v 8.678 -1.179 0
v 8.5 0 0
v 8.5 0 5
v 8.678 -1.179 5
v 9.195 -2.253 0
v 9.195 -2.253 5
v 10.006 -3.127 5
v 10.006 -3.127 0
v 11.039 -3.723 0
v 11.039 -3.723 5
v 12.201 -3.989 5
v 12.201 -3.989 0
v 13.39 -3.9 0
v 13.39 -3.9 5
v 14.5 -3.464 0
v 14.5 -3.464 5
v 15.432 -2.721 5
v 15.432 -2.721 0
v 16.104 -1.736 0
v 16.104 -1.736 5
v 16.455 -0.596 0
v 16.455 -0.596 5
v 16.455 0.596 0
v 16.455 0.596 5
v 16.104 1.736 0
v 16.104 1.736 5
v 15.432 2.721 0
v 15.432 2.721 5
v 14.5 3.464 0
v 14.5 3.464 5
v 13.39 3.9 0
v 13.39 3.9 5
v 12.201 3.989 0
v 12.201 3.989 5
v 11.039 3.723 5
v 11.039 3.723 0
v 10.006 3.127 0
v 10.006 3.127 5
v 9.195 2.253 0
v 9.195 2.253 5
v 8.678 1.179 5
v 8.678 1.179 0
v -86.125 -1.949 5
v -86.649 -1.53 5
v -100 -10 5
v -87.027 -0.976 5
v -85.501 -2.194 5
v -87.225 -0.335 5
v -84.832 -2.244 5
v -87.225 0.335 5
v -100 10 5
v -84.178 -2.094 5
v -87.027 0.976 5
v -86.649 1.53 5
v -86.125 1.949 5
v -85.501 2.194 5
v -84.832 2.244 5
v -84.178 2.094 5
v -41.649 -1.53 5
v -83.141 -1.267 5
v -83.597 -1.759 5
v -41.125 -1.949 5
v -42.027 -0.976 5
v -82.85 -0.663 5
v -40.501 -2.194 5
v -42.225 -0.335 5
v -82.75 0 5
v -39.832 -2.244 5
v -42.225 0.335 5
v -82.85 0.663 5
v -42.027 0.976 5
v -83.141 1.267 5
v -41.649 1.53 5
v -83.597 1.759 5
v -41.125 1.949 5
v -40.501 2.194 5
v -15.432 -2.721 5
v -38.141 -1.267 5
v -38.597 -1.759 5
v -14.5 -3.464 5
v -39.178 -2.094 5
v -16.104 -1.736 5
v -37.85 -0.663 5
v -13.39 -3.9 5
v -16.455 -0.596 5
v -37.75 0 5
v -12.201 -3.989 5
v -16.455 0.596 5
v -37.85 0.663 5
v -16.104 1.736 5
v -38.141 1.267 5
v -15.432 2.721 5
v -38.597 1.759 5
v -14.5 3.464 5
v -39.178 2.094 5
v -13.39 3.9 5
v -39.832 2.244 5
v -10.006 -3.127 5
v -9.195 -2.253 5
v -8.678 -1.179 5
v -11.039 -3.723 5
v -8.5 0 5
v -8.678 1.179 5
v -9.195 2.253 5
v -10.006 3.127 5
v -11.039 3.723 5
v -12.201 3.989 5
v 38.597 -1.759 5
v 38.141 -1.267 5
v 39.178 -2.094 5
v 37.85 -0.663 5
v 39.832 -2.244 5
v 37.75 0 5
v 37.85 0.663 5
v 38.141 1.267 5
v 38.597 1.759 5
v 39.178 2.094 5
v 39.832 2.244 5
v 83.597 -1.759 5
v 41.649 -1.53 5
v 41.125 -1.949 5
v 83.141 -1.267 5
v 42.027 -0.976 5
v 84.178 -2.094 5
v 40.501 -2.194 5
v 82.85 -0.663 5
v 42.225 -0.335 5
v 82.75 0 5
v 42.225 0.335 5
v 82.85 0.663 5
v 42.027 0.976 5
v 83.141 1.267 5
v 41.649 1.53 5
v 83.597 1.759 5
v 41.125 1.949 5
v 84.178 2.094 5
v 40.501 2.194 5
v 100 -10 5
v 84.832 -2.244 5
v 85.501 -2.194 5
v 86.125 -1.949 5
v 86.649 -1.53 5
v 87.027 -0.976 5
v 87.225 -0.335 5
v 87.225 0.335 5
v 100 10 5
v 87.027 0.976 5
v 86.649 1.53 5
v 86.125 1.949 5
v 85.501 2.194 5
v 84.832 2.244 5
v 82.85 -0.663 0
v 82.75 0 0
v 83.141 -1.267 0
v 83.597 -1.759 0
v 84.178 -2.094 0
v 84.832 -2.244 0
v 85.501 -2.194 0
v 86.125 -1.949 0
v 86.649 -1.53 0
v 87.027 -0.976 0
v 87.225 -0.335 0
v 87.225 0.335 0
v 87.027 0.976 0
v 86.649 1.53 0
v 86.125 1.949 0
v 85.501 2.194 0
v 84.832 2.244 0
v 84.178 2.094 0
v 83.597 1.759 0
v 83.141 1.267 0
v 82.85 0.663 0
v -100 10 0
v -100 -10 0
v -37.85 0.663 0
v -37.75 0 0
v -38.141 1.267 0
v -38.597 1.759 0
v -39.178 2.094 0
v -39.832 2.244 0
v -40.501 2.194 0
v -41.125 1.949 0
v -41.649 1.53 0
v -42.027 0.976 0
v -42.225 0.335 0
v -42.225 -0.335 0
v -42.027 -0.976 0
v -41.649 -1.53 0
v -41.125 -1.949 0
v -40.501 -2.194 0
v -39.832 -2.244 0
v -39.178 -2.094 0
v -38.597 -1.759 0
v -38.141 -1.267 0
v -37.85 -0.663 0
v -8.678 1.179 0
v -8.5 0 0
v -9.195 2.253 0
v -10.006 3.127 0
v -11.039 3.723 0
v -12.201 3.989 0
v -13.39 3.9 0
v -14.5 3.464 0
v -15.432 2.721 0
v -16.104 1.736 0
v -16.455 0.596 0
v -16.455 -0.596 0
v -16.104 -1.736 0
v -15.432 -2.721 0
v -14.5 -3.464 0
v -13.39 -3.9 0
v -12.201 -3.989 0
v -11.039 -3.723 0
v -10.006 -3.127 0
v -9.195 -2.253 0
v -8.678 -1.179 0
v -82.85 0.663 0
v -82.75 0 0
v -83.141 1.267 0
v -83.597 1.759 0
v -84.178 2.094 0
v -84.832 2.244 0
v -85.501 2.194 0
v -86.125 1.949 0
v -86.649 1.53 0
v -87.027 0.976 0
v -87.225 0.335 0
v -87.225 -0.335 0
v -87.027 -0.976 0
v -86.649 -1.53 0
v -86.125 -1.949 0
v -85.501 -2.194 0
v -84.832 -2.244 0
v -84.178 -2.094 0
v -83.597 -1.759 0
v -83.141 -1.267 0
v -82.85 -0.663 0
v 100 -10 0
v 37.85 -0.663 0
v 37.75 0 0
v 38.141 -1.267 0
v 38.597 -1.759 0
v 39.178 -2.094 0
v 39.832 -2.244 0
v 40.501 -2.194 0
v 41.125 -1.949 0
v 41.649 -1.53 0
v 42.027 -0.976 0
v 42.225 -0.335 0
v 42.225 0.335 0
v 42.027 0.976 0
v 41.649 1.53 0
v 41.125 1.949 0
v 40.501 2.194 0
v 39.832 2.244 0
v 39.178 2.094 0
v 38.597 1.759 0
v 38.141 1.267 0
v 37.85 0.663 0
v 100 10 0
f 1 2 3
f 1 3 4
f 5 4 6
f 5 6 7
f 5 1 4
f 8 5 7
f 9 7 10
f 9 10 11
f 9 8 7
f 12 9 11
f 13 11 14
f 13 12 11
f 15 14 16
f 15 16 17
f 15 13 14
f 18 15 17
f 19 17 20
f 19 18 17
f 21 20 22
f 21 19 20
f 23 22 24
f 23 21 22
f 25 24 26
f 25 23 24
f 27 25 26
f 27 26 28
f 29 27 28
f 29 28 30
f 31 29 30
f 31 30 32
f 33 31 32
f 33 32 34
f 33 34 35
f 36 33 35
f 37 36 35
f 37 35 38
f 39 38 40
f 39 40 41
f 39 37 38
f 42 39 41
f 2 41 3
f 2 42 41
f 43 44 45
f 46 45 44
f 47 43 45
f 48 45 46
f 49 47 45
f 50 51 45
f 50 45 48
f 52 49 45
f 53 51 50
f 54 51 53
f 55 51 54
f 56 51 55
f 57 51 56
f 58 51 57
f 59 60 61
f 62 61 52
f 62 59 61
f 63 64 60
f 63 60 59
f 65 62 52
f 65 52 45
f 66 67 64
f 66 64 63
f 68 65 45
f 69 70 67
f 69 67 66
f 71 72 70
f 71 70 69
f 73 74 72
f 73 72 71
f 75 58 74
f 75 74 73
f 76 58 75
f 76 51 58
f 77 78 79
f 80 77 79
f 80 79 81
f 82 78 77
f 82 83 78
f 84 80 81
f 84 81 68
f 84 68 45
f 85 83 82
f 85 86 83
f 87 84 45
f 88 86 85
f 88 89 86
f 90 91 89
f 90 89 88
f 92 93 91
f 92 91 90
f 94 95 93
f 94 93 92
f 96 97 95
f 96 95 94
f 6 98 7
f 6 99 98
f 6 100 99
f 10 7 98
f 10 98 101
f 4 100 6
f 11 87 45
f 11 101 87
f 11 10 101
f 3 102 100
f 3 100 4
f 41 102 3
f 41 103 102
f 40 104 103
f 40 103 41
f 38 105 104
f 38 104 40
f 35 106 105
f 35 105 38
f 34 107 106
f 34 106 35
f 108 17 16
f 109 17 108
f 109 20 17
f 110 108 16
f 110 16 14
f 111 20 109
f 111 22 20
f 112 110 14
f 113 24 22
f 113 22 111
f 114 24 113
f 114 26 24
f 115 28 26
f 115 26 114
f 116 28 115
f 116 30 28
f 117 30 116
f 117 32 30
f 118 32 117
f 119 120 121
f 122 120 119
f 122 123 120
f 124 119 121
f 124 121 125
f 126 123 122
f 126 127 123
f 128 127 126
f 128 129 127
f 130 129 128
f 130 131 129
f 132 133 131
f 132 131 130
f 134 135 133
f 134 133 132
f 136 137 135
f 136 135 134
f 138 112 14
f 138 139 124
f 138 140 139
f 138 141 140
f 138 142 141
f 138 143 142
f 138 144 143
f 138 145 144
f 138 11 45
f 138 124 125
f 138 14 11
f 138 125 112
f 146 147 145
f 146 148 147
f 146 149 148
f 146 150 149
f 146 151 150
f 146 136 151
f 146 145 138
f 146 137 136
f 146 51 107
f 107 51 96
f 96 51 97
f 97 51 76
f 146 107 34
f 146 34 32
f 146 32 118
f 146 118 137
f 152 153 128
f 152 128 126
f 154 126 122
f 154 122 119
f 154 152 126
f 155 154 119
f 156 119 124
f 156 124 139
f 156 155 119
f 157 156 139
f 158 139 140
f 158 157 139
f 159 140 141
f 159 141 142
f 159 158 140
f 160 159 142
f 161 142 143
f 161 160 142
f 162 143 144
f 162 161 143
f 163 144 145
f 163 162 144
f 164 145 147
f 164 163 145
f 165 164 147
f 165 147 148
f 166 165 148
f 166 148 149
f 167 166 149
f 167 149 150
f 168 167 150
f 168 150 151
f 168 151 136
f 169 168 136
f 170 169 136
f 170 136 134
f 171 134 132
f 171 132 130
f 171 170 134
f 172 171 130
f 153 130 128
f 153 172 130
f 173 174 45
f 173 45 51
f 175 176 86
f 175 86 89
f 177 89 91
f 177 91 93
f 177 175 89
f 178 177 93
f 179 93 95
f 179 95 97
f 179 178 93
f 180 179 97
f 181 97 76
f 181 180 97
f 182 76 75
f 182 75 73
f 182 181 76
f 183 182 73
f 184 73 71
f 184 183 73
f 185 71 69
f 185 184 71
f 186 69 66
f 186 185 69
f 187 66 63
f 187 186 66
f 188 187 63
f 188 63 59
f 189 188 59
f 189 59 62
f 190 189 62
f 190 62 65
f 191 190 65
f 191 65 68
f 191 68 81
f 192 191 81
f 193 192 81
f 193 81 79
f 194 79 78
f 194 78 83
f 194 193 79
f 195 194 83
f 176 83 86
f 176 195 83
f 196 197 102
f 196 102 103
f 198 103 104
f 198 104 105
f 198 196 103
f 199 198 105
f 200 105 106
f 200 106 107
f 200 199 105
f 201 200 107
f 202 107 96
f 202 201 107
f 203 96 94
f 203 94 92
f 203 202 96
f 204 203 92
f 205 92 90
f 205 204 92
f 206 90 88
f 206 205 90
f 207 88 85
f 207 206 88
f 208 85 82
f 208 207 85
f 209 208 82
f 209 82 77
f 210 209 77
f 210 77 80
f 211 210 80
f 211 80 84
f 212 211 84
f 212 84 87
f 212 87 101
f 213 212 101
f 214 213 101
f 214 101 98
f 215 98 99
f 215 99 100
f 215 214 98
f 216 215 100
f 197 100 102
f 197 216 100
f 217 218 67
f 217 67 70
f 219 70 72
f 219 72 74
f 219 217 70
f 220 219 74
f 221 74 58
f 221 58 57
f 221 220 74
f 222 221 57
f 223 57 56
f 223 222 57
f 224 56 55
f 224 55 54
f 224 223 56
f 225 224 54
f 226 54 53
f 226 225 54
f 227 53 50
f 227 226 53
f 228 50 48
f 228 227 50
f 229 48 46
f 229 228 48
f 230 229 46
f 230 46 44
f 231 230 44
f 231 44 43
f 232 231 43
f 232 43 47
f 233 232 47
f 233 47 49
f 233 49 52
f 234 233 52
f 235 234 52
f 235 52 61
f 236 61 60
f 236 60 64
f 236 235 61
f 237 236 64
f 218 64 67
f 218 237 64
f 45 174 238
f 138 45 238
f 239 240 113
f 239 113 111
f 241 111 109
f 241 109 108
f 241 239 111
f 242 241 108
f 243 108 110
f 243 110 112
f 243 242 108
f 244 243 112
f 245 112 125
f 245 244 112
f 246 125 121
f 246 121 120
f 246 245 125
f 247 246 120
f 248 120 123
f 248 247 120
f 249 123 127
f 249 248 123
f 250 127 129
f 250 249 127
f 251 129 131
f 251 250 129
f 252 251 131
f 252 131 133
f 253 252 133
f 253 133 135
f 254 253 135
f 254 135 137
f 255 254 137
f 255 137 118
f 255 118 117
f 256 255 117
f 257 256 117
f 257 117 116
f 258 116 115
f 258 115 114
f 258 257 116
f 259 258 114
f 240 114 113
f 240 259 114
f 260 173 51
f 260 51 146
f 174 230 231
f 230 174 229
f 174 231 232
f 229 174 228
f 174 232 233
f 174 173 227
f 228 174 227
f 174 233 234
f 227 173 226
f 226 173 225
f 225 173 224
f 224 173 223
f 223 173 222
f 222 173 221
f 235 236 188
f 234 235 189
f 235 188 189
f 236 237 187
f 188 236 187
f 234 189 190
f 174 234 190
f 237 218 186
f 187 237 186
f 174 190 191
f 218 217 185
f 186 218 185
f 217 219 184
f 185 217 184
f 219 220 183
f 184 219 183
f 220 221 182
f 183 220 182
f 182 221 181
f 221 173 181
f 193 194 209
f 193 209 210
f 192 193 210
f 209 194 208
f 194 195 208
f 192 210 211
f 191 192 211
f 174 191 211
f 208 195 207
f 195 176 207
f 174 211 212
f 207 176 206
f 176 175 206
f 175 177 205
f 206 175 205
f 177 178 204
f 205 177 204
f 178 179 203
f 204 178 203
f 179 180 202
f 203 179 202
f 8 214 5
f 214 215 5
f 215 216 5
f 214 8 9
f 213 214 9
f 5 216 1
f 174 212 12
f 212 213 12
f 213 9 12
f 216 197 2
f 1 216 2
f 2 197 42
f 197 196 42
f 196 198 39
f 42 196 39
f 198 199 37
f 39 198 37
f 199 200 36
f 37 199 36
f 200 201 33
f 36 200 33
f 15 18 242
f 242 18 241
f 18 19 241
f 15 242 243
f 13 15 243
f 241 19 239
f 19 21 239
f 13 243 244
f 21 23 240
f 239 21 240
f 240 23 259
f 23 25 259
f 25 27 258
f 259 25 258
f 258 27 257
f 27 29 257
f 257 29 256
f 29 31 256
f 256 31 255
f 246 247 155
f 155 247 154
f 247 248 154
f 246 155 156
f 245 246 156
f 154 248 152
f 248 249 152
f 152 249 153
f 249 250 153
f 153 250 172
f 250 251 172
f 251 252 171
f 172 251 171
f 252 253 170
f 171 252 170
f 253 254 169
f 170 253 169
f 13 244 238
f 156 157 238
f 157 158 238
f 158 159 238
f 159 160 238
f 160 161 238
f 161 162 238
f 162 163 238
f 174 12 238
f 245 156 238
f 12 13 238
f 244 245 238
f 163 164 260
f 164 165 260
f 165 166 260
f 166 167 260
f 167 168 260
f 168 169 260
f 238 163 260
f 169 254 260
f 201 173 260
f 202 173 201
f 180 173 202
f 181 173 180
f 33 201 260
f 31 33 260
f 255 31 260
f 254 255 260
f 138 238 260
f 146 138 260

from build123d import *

# Parameters (mm, degrees)
ESQUISSE1_W        = 200
ESQUISSE1_H        = 20
ESQUISSE1_R        = 2.25
ESQUISSE1_R_2      = 4
BOSS_EXTRU_1_DEPTH = 5


with BuildPart() as part:
    # Esquisse1 → Boss.-Extru.1 (new body)
    with BuildSketch(Plane.XY):
        Rectangle(ESQUISSE1_W, ESQUISSE1_H)
        with Locations((-85, 0)):
            Circle(ESQUISSE1_R, mode=Mode.SUBTRACT)
        with Locations((-40, 0)):
            Circle(ESQUISSE1_R, mode=Mode.SUBTRACT)
        with Locations(Location((40, 0, 0), (0, 0, 180))):
            Circle(ESQUISSE1_R, mode=Mode.SUBTRACT)
        with Locations(Location((85, 0, 0), (0, 0, 180))):
            Circle(ESQUISSE1_R, mode=Mode.SUBTRACT)
        with Locations((-12.5, 0)):
            Circle(ESQUISSE1_R_2, mode=Mode.SUBTRACT)
        with Locations(Location((12.5, 0, 0), (0, 0, 180))):
            Circle(ESQUISSE1_R_2, mode=Mode.SUBTRACT)
    extrude(amount=BOSS_EXTRU_1_DEPTH)


solid = part.part
